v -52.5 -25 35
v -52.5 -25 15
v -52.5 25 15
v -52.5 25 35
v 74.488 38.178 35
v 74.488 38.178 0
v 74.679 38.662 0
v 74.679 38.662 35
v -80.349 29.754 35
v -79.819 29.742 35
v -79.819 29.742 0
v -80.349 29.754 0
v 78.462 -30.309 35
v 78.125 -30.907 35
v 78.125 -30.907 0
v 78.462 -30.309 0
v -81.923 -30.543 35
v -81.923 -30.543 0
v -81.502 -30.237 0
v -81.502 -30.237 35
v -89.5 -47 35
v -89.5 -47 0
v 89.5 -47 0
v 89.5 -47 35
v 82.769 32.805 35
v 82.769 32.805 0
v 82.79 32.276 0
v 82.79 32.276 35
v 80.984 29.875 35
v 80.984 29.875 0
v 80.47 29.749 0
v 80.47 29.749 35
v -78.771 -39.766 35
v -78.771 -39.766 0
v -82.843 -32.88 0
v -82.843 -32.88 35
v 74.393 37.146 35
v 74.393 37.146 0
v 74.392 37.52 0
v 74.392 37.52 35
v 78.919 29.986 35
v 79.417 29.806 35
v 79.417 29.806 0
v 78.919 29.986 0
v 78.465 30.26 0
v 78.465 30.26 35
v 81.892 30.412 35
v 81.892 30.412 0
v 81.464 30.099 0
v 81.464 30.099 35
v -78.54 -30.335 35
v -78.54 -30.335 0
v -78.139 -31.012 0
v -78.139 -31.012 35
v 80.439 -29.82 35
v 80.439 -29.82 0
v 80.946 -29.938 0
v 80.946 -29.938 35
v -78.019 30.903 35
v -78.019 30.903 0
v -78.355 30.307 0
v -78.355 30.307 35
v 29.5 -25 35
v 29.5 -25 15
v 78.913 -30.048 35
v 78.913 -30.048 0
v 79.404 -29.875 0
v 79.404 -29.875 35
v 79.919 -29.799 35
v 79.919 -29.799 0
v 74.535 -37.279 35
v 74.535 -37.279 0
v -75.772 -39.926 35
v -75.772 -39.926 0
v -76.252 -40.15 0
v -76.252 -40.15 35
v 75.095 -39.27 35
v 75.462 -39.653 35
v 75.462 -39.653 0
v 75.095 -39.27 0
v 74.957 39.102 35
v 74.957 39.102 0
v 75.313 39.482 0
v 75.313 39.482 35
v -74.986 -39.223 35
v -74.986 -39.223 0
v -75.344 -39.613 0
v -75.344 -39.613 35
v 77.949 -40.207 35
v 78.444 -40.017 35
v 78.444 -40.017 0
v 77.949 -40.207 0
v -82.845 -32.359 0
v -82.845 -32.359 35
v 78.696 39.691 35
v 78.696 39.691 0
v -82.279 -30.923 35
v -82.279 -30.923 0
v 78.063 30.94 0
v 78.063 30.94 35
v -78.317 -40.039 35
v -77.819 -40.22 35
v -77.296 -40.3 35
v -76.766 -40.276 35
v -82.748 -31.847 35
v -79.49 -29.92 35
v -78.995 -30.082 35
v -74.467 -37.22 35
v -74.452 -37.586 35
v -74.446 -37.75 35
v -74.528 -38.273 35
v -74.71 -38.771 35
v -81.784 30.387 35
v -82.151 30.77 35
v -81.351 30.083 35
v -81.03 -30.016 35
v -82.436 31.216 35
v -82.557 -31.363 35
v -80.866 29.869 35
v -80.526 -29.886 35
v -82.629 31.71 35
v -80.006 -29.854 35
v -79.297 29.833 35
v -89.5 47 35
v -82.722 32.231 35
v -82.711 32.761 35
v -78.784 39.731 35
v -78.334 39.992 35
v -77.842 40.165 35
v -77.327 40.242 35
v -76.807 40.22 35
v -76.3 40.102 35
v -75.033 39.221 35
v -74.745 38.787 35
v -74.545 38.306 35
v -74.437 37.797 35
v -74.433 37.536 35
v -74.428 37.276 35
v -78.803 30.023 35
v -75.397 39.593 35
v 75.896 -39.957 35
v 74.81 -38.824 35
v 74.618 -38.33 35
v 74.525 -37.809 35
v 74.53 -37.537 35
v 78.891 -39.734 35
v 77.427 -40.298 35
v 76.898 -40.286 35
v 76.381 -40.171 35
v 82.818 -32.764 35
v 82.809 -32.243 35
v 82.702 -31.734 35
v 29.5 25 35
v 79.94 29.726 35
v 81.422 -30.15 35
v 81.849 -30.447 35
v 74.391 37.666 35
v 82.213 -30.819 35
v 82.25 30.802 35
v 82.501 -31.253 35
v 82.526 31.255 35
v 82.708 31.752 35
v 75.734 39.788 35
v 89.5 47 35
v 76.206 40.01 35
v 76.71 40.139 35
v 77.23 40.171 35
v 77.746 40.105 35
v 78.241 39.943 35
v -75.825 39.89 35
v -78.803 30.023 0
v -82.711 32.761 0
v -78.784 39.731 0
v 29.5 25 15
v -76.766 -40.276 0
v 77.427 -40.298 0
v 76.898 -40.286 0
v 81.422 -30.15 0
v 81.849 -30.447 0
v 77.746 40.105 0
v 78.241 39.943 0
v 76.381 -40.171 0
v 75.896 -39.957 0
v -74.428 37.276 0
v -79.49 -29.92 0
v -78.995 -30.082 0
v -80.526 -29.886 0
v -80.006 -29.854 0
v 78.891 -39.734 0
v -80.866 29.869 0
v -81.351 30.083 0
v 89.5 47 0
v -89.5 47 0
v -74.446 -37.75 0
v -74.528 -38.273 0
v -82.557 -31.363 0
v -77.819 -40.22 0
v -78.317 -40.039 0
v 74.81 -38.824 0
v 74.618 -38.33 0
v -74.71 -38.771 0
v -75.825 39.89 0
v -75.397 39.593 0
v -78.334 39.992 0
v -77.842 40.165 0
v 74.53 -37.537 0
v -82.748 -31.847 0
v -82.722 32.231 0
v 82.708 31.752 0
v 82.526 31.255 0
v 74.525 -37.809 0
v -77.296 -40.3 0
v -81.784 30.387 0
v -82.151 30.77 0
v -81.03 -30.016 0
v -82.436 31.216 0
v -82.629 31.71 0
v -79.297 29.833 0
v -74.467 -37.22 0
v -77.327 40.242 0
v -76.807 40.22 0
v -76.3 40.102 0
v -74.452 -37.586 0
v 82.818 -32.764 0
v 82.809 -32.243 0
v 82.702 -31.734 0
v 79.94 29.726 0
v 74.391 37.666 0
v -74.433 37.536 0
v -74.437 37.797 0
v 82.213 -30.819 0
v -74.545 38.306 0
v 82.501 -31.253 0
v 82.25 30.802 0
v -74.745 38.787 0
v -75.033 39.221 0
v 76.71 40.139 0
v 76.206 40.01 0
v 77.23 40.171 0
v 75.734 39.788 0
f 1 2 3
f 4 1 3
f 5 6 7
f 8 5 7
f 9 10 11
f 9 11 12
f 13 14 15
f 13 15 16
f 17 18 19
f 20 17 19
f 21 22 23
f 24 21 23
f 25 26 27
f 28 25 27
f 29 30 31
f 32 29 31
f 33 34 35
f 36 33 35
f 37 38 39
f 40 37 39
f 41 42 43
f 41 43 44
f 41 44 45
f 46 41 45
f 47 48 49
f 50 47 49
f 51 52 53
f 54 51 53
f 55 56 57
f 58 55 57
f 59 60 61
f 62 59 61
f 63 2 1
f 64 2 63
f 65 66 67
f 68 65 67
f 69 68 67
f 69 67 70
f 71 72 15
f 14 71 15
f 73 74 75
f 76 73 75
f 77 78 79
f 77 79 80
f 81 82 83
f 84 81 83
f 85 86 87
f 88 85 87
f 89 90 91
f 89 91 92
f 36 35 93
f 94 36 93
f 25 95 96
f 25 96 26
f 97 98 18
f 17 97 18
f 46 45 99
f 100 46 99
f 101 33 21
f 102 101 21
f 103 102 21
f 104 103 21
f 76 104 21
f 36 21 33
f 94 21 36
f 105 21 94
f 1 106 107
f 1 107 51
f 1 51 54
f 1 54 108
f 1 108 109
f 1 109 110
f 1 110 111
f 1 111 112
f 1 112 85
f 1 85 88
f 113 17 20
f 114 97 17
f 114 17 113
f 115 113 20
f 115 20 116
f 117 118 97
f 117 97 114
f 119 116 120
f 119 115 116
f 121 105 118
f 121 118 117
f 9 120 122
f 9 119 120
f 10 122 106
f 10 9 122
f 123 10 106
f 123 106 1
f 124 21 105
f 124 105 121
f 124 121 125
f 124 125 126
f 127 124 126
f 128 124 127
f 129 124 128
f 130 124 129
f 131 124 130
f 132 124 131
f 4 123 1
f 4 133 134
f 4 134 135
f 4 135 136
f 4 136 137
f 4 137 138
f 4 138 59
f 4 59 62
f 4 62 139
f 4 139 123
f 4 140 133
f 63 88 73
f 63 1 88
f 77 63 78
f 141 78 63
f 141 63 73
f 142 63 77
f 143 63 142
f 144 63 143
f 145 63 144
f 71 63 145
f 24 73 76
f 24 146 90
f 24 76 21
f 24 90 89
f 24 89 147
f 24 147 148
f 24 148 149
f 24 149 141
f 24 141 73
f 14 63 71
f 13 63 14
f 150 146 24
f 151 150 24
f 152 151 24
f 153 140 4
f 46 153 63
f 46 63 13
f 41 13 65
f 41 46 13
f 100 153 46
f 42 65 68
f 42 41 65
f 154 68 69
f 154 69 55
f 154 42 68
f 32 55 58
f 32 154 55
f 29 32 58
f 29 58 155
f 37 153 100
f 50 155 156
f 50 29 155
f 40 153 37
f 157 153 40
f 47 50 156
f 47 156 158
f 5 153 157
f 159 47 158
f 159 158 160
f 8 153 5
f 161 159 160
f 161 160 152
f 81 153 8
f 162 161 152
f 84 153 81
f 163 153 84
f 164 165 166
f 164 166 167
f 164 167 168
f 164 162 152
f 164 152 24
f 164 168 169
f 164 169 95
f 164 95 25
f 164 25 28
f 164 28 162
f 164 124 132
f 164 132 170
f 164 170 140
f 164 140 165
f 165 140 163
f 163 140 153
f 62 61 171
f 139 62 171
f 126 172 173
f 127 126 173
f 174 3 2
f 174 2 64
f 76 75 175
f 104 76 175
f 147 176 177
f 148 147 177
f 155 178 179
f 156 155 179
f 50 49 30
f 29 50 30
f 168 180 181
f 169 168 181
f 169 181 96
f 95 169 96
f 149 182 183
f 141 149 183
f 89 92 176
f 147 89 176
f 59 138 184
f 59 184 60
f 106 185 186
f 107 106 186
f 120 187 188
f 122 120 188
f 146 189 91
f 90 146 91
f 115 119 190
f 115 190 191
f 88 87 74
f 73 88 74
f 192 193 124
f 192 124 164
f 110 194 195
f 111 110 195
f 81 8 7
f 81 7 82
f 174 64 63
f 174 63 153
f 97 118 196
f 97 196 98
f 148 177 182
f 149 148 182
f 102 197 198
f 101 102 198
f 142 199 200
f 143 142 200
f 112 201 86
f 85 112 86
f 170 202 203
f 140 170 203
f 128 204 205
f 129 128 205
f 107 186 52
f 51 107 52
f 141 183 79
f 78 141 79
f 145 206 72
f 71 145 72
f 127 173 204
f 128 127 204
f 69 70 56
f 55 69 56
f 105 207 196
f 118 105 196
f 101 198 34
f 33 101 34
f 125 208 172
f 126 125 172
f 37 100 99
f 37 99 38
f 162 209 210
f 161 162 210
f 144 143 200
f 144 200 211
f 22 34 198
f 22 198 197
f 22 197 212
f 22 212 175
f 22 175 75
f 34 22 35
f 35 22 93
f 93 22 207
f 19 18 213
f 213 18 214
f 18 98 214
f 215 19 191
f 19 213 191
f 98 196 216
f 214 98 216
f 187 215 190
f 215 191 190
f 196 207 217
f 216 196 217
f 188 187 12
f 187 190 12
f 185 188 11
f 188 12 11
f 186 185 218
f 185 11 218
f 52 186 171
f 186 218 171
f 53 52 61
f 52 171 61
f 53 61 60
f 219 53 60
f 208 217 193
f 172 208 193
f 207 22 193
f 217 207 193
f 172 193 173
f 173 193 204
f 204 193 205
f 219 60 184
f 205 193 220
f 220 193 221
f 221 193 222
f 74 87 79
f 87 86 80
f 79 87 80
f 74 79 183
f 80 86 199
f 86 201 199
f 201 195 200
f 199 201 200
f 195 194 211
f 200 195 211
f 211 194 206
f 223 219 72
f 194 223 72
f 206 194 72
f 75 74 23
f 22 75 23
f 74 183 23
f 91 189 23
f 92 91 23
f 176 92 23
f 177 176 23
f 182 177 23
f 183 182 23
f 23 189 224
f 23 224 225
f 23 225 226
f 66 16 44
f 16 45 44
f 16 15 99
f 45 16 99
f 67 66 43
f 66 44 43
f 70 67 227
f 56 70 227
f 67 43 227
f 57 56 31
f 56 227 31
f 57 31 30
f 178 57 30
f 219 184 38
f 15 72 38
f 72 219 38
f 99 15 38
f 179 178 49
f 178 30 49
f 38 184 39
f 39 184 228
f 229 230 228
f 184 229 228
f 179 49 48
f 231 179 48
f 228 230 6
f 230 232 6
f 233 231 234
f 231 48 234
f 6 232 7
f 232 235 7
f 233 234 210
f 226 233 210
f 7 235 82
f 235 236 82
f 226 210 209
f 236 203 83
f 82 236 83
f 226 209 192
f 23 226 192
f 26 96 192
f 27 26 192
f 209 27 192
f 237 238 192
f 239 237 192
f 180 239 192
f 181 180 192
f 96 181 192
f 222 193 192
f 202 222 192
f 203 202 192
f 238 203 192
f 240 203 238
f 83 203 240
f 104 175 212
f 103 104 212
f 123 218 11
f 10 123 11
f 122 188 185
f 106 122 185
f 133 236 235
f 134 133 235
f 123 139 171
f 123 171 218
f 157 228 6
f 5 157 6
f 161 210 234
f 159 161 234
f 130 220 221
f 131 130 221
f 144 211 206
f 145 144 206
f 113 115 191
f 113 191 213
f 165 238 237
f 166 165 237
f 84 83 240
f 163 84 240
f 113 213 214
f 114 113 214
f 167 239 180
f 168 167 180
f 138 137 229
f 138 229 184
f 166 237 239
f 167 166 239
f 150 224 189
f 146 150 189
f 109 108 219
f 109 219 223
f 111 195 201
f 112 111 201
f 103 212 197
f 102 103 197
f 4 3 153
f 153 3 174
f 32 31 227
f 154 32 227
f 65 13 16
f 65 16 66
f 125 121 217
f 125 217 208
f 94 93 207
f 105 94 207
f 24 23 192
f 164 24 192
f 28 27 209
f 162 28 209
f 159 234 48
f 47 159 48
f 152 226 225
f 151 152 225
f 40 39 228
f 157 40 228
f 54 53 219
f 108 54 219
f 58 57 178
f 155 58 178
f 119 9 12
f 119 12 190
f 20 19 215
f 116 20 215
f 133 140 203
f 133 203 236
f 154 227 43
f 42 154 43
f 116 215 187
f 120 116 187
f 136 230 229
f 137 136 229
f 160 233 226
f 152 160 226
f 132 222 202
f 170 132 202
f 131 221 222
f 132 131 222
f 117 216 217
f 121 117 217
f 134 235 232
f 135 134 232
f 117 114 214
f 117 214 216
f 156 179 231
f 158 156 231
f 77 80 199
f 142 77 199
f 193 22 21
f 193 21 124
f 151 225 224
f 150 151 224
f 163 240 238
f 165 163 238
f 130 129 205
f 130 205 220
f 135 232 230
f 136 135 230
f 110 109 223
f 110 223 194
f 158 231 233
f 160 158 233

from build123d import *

# Parameters (mm, degrees)
F0_W     = 179
F0_H     = 94
F0_W_2   = 82
F0_H_2   = 49.999998
F1_DEPTH = 35
F2_DEPTH = 15


with BuildPart() as f1:
    # F0 (on Top) → F1 (new body)
    with BuildSketch(Plane.XY):
        Rectangle(F0_W, F0_H)
        Polygon((-79.489959, -29.920486), (-78.995136, -30.08246), (-78.53955, -30.334507), (-78.1386, -31.012478), (-74.467219, -37.220443), (-74.45244, -37.585563), (-74.445794, -37.74979), (-74.527791, -38.273187), (-74.710072, -38.77062), (-74.985671, -39.223072), (-75.344048, -39.613243), (-75.7715, -39.926215), (-76.251686, -40.15002), (-76.766246, -40.276102), (-77.295502, -40.29964), (-77.819223, -40.219734), (-78.31738, -40.039439), (-78.770929, -39.765649), (-82.84326, -32.879713), (-82.84465, -32.359057), (-82.748207, -31.847408), (-82.557362, -31.362987), (-82.278913, -30.923042), (-81.922774, -30.543238), (-81.501627, -30.237101), (-81.030467, -30.015529), (-80.526071, -29.886415), (-80.006401, -29.854352), align=None, mode=Mode.SUBTRACT)
        Polygon((82.808956, -32.243232), (82.818469, -32.763804), (78.891239, -39.733514), (78.443523, -40.016743), (77.949251, -40.207431), (77.427319, -40.298287), (76.897685, -40.285837), (76.380599, -40.17056), (75.895831, -39.956859), (75.461917, -39.652909), (75.095447, -39.270329), (74.810434, -38.823747), (74.617775, -38.33024), (74.524835, -37.808676), (74.530136, -37.537048), (74.53517, -37.278996), (78.125485, -30.907213), (78.4624, -30.309285), (78.912607, -30.047753), (79.403929, -29.875452), (79.918872, -29.798517), (80.439101, -29.819689), (80.946089, -29.938213), (81.421786, -30.149868), (81.849253, -30.447118), (82.213267, -30.81938), (82.500869, -31.253398), (82.701817, -31.733715), align=None, mode=Mode.SUBTRACT)
        with Locations((-11.5, 0)):
            Rectangle(F0_W_2, F0_H_2, mode=Mode.SUBTRACT)
        Polygon((-74.745494, 38.78665), (-74.544546, 38.306332), (-74.437408, 37.796815), (-74.432649, 37.536394), (-74.427894, 37.276243), (-78.019246, 30.902619), (-78.355124, 30.306533), (-78.80284, 30.023304), (-79.297113, 29.832617), (-79.819044, 29.741761), (-80.348679, 29.75421), (-80.865765, 29.869488), (-81.350532, 30.083188), (-81.784446, 30.387139), (-82.150917, 30.769718), (-82.435929, 31.2163), (-82.628588, 31.709807), (-82.721528, 32.231372), (-82.711193, 32.761052), (-78.783964, 39.730762), (-78.333757, 39.992295), (-77.842433, 40.164595), (-77.32749, 40.24153), (-76.807263, 40.220358), (-76.300273, 40.101835), (-75.824577, 39.890179), (-75.397111, 39.592929), (-75.033095, 39.220667), align=None, mode=Mode.SUBTRACT)
        Polygon((78.240855, 39.942996), (78.69644, 39.690949), (82.768772, 32.805012), (82.790197, 32.275666), (82.708201, 31.752269), (82.525919, 31.254834), (82.250321, 30.802382), (81.891943, 30.412212), (81.464491, 30.099241), (80.984305, 29.875435), (80.469745, 29.749353), (79.940489, 29.725815), (79.416768, 29.805721), (78.918611, 29.986015), (78.465062, 30.259805), (78.062882, 30.939855), (74.39273, 37.145741), (74.391731, 37.519846), (74.391341, 37.666399), (74.487784, 38.178047), (74.678629, 38.662468), (74.957078, 39.102413), (75.313217, 39.482216), (75.734364, 39.788353), (76.205524, 40.009925), (76.70992, 40.139041), (77.22959, 40.171102), (77.746032, 40.104968), align=None, mode=Mode.SUBTRACT)
    extrude(amount=F1_DEPTH)

    # F0 (on Top) → F2 (join)
    with BuildSketch(Plane.XY):
        with Locations((-11.5, 0)):
            Rectangle(F0_W_2, F0_H_2)
    extrude(amount=F2_DEPTH)


solid = f1.part
